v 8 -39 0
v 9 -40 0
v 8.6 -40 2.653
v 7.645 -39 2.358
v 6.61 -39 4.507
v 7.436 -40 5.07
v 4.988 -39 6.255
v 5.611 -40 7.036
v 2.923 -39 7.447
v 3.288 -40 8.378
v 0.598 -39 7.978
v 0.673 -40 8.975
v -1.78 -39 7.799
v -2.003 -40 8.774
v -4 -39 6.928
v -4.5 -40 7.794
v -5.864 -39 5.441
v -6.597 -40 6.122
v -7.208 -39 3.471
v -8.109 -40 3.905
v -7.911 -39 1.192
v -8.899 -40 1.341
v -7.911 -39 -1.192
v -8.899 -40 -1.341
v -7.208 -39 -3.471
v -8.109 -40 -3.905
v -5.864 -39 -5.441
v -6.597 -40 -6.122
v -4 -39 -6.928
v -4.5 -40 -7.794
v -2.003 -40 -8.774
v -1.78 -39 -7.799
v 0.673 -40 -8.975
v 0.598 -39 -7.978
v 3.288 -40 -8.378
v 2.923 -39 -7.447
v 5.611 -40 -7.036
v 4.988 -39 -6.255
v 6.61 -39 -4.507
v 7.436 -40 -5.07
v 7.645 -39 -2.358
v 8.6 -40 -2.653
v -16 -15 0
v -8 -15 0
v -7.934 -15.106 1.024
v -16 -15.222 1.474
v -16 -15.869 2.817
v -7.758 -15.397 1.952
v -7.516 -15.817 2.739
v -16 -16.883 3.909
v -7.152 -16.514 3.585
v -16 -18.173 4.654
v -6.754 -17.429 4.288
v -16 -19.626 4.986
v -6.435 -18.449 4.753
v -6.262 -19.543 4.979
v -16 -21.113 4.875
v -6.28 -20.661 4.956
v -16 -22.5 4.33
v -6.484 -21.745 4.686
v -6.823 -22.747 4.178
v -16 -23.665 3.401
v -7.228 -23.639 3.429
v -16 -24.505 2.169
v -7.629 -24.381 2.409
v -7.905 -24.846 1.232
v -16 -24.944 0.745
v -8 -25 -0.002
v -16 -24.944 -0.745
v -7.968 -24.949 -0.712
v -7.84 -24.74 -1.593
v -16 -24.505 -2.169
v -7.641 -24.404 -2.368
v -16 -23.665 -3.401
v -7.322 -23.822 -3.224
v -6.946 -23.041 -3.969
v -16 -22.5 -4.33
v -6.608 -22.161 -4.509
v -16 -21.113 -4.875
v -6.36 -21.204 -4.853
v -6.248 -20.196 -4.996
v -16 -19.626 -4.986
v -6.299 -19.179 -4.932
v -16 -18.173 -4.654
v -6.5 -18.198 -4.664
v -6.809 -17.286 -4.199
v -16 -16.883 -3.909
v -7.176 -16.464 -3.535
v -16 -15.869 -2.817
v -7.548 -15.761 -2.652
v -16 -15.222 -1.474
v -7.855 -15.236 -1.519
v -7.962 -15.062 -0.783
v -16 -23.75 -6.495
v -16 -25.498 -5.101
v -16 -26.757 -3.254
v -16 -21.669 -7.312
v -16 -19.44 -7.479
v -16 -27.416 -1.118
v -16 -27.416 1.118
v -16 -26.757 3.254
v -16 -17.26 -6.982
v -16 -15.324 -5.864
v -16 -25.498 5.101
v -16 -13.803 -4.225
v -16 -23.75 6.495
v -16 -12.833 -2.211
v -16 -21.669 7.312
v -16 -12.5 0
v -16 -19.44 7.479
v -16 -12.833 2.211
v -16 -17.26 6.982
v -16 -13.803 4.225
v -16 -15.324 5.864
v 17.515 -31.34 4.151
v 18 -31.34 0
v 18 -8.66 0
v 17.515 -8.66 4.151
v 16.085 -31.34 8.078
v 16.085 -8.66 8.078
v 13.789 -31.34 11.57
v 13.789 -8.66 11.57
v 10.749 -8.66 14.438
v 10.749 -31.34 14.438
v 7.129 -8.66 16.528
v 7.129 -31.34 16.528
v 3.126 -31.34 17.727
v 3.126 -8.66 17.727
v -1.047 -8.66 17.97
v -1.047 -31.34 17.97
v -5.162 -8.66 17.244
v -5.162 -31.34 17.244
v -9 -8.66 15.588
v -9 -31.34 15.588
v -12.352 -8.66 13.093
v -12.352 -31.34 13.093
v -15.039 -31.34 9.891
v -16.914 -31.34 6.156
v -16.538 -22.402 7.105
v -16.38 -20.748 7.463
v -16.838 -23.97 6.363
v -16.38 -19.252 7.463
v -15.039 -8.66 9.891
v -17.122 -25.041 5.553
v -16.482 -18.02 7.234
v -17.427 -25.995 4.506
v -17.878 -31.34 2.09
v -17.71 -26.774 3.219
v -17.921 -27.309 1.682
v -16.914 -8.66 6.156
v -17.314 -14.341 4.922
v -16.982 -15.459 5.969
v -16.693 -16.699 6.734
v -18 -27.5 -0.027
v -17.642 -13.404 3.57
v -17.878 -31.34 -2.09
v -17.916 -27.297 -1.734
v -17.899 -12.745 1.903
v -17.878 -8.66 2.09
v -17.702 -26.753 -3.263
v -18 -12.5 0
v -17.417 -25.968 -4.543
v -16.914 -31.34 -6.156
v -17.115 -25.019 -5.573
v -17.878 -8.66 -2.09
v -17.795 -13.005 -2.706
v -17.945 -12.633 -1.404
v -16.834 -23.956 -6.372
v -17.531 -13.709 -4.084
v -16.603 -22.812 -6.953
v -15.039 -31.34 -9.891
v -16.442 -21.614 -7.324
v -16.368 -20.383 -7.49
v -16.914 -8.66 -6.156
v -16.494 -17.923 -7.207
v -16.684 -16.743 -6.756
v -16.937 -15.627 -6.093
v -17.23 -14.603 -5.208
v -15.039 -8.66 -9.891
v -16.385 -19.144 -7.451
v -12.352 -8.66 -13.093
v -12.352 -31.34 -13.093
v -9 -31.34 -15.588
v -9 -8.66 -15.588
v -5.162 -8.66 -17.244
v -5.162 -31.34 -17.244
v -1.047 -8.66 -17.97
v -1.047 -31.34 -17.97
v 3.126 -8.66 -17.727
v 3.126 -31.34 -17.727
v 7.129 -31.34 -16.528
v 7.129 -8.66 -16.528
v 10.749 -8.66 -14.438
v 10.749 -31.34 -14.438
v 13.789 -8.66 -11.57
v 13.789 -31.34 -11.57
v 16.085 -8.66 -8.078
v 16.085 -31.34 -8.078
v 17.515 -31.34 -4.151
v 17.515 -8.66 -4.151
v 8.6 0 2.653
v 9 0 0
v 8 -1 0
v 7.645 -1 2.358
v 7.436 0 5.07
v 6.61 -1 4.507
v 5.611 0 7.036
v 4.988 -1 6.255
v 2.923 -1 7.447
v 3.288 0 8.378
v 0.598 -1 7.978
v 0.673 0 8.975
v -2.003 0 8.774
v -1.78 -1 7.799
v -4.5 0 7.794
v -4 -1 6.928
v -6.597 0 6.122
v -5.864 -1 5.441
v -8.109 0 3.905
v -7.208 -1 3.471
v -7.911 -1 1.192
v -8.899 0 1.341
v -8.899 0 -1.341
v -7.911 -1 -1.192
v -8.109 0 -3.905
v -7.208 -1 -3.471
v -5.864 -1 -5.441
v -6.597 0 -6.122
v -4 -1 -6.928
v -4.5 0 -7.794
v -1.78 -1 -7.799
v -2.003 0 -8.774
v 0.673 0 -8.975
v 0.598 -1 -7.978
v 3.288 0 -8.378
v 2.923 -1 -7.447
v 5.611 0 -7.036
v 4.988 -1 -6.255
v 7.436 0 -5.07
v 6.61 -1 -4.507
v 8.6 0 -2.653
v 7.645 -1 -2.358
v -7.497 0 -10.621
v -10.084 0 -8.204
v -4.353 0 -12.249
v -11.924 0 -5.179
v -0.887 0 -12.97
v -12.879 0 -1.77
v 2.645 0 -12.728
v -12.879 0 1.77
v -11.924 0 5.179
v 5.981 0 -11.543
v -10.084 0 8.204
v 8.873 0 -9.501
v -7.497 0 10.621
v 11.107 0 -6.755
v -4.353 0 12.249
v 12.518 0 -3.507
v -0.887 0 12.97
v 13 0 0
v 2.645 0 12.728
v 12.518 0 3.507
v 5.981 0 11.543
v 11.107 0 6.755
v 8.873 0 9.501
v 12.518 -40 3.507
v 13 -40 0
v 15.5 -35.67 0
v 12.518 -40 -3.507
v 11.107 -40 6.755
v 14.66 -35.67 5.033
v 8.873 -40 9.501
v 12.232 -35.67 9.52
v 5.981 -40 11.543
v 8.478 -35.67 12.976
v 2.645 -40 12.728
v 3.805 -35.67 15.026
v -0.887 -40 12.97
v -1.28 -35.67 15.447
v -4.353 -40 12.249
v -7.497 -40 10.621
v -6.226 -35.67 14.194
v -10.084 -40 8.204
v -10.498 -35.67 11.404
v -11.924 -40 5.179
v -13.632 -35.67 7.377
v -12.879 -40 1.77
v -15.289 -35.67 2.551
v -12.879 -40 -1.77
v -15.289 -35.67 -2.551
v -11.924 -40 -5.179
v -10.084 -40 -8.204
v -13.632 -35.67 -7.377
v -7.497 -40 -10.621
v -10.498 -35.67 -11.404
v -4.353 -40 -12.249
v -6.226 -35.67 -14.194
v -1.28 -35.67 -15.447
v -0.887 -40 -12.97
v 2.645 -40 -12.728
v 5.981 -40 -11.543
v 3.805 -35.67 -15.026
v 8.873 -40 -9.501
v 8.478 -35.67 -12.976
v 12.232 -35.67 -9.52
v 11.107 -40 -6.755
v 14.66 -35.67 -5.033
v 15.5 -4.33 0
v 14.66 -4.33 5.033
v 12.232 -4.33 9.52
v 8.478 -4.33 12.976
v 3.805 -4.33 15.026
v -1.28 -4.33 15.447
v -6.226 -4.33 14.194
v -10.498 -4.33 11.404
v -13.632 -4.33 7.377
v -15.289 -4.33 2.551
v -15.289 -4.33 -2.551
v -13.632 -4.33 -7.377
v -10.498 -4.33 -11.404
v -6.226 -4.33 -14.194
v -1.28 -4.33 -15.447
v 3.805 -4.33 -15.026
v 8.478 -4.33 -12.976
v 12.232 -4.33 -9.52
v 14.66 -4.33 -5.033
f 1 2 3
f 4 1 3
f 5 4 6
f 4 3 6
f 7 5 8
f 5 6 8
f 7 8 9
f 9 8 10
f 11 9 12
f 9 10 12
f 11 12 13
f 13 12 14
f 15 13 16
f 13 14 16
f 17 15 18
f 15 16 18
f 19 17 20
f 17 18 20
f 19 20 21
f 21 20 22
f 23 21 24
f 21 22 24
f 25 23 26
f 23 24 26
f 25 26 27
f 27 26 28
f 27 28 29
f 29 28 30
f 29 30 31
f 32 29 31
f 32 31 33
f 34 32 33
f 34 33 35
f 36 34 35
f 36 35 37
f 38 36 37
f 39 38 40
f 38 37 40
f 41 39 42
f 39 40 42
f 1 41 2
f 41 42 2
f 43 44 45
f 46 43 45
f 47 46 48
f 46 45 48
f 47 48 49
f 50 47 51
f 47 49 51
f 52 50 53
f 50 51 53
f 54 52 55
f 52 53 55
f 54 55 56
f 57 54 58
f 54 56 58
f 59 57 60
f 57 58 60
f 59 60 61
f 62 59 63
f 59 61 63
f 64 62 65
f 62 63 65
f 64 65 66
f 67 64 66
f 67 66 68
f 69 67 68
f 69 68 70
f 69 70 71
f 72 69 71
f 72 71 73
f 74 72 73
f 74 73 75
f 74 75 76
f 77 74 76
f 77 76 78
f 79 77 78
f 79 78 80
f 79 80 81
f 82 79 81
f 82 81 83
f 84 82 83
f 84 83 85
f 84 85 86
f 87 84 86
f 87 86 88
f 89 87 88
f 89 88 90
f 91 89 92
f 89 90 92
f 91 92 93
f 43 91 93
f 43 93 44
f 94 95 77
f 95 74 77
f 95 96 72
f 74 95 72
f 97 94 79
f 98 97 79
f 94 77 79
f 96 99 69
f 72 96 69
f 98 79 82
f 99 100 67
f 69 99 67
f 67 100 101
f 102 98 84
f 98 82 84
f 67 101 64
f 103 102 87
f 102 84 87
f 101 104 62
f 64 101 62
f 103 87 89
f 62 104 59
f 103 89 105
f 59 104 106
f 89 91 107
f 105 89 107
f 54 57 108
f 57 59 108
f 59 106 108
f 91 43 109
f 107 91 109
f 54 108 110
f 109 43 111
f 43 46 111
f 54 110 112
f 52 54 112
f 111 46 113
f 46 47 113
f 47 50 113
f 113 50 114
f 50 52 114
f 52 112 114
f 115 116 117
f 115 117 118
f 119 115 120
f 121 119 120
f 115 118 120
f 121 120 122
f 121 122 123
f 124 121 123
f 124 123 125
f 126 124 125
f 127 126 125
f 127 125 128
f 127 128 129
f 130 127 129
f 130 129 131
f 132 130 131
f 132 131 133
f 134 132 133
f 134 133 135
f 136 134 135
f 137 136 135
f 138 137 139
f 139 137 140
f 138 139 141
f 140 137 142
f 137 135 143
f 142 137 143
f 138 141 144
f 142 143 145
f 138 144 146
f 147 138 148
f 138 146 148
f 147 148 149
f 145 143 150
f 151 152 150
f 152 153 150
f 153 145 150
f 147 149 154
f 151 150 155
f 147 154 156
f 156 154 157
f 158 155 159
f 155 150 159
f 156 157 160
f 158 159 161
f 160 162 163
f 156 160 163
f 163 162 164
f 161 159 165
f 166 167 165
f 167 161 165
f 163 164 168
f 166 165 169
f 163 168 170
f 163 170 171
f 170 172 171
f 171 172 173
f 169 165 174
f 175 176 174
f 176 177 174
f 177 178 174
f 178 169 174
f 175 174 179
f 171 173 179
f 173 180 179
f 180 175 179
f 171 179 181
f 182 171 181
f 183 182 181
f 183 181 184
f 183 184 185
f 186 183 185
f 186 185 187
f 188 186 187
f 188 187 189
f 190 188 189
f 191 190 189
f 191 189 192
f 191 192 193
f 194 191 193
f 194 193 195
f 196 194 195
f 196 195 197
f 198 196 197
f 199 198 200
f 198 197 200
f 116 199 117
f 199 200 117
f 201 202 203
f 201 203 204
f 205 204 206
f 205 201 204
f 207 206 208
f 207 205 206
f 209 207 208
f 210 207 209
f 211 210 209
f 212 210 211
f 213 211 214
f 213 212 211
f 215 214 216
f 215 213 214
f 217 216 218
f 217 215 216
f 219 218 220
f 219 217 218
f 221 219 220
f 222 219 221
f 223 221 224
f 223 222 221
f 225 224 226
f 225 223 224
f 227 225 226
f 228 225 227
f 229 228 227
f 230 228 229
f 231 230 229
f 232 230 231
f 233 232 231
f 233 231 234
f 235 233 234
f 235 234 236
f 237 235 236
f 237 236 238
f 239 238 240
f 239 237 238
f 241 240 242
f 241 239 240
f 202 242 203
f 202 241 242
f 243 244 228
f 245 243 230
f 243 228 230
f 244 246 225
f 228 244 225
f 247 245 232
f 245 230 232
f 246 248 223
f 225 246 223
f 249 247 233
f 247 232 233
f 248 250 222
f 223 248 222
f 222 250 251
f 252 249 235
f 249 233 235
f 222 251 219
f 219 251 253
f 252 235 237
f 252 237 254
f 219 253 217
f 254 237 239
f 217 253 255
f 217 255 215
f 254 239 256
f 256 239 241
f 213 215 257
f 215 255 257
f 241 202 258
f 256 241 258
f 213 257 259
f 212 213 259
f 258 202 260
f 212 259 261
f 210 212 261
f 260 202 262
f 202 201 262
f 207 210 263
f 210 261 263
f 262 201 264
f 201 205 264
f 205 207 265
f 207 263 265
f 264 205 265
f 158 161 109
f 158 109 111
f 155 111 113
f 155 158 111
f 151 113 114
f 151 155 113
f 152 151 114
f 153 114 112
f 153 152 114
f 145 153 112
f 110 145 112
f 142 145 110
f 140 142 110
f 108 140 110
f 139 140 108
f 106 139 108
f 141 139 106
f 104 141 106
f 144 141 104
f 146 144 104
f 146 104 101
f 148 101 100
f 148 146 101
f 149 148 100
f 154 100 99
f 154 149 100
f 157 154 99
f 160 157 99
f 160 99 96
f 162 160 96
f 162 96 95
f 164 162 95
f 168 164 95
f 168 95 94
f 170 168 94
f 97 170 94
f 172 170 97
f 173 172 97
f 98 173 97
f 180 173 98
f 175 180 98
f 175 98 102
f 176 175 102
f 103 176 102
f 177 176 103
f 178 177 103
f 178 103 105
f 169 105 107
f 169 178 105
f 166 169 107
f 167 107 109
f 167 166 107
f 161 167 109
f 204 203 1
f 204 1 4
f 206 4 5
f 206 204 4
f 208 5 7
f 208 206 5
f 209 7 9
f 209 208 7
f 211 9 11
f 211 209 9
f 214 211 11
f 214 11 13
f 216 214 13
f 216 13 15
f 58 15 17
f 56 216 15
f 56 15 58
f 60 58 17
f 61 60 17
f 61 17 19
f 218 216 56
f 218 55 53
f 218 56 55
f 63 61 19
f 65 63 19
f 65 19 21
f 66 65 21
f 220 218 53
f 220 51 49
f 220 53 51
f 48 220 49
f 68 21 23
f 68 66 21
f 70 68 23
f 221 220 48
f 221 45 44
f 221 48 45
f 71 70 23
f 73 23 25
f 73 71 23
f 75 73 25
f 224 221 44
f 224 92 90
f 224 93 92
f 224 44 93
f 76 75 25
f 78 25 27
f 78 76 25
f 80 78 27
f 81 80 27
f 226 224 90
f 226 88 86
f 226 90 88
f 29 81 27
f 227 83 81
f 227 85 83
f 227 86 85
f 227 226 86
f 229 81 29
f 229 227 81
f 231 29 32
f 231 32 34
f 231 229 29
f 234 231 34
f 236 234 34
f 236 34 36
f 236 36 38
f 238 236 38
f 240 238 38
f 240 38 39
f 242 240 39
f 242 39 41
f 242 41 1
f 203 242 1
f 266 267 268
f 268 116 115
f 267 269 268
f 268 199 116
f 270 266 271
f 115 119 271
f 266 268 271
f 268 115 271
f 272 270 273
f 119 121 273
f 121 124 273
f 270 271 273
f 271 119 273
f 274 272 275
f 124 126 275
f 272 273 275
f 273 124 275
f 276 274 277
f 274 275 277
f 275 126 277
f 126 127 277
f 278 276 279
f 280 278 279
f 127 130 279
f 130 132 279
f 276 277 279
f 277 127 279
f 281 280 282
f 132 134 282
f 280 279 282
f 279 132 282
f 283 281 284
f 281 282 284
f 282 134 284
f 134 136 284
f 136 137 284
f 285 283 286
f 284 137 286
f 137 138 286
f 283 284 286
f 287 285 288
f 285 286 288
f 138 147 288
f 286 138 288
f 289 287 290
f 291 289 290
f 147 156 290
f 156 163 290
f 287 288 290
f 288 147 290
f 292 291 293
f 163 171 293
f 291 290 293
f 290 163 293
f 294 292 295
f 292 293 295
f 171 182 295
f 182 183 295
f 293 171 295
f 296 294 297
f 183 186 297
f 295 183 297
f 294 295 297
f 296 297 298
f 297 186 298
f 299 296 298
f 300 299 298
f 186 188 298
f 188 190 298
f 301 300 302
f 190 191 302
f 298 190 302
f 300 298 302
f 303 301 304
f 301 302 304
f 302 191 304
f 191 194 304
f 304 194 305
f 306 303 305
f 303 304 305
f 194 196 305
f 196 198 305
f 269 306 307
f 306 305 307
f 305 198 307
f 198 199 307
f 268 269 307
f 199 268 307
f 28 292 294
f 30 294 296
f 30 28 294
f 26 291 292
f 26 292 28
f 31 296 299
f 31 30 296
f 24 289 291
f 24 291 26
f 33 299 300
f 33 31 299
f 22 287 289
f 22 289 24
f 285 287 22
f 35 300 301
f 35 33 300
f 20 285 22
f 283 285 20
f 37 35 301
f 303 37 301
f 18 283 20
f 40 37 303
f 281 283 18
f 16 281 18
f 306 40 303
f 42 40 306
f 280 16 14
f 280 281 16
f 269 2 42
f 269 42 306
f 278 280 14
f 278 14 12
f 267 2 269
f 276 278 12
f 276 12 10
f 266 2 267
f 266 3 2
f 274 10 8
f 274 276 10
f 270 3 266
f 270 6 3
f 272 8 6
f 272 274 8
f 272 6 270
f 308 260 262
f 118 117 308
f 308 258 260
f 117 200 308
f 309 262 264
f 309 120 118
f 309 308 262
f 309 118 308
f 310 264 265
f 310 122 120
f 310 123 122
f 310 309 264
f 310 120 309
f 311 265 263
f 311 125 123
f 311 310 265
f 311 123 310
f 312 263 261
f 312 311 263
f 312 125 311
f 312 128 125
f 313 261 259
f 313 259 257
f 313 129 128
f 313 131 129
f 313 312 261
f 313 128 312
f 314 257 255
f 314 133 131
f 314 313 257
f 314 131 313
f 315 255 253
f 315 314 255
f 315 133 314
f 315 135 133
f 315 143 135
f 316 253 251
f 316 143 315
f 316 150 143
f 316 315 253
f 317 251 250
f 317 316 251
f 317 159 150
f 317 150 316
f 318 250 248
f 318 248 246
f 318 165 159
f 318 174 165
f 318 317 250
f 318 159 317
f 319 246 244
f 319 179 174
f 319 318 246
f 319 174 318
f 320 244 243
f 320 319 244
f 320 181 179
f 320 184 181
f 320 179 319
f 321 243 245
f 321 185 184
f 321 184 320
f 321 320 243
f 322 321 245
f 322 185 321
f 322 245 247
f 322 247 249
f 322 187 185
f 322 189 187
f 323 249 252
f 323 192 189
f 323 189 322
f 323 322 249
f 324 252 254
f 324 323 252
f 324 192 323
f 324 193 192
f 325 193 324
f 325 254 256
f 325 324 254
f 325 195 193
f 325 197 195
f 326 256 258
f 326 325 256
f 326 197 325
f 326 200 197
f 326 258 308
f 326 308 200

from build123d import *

# Parameters (mm, degrees)
F0_R     = 18
F0_R_2   = 8
F1_DEPTH = 40
F2_R     = 5
F3_DEPTH = 25
F5_R     = 7.5
F6_DEPTH = 2
F7_SIZE  = 1
F8_SIZE2 = 8.660254
F8_SIZE  = 5


with BuildPart() as f1:
    # F0 (on Front) → F1 (new body)
    with BuildSketch(Plane.XZ):
        Circle(F0_R)
        Circle(F0_R_2, mode=Mode.SUBTRACT)
    extrude(amount=F1_DEPTH)

    # F2 (on Right) → F3 (cut)
    with BuildSketch(Plane.YZ):
        with Locations((-20, 0)):
            Circle(F2_R)
    extrude(amount=-F3_DEPTH, mode=Mode.SUBTRACT)

    # F5 (on offset) → F6 (cut)
    with BuildSketch(Plane.YZ.offset(-18)):
        with Locations((-20, 0)):
            Circle(F5_R)
    extrude(amount=F6_DEPTH, mode=Mode.SUBTRACT)

    # F7
    f7_edges = [f1.edges().sort_by_distance(p)[0] for p in [
        (-8, -40, 0),
        (-8, 0, 0),
    ]]
    chamfer(f7_edges, length=F7_SIZE)

    # F8
    f8_edges = [f1.edges().sort_by_distance(p)[0] for p in [
        (-18, -40, 0),
        (-18, 0, 0),
    ]]
    chamfer(f8_edges, length=F8_SIZE, length2=F8_SIZE2)


solid = f1.part
